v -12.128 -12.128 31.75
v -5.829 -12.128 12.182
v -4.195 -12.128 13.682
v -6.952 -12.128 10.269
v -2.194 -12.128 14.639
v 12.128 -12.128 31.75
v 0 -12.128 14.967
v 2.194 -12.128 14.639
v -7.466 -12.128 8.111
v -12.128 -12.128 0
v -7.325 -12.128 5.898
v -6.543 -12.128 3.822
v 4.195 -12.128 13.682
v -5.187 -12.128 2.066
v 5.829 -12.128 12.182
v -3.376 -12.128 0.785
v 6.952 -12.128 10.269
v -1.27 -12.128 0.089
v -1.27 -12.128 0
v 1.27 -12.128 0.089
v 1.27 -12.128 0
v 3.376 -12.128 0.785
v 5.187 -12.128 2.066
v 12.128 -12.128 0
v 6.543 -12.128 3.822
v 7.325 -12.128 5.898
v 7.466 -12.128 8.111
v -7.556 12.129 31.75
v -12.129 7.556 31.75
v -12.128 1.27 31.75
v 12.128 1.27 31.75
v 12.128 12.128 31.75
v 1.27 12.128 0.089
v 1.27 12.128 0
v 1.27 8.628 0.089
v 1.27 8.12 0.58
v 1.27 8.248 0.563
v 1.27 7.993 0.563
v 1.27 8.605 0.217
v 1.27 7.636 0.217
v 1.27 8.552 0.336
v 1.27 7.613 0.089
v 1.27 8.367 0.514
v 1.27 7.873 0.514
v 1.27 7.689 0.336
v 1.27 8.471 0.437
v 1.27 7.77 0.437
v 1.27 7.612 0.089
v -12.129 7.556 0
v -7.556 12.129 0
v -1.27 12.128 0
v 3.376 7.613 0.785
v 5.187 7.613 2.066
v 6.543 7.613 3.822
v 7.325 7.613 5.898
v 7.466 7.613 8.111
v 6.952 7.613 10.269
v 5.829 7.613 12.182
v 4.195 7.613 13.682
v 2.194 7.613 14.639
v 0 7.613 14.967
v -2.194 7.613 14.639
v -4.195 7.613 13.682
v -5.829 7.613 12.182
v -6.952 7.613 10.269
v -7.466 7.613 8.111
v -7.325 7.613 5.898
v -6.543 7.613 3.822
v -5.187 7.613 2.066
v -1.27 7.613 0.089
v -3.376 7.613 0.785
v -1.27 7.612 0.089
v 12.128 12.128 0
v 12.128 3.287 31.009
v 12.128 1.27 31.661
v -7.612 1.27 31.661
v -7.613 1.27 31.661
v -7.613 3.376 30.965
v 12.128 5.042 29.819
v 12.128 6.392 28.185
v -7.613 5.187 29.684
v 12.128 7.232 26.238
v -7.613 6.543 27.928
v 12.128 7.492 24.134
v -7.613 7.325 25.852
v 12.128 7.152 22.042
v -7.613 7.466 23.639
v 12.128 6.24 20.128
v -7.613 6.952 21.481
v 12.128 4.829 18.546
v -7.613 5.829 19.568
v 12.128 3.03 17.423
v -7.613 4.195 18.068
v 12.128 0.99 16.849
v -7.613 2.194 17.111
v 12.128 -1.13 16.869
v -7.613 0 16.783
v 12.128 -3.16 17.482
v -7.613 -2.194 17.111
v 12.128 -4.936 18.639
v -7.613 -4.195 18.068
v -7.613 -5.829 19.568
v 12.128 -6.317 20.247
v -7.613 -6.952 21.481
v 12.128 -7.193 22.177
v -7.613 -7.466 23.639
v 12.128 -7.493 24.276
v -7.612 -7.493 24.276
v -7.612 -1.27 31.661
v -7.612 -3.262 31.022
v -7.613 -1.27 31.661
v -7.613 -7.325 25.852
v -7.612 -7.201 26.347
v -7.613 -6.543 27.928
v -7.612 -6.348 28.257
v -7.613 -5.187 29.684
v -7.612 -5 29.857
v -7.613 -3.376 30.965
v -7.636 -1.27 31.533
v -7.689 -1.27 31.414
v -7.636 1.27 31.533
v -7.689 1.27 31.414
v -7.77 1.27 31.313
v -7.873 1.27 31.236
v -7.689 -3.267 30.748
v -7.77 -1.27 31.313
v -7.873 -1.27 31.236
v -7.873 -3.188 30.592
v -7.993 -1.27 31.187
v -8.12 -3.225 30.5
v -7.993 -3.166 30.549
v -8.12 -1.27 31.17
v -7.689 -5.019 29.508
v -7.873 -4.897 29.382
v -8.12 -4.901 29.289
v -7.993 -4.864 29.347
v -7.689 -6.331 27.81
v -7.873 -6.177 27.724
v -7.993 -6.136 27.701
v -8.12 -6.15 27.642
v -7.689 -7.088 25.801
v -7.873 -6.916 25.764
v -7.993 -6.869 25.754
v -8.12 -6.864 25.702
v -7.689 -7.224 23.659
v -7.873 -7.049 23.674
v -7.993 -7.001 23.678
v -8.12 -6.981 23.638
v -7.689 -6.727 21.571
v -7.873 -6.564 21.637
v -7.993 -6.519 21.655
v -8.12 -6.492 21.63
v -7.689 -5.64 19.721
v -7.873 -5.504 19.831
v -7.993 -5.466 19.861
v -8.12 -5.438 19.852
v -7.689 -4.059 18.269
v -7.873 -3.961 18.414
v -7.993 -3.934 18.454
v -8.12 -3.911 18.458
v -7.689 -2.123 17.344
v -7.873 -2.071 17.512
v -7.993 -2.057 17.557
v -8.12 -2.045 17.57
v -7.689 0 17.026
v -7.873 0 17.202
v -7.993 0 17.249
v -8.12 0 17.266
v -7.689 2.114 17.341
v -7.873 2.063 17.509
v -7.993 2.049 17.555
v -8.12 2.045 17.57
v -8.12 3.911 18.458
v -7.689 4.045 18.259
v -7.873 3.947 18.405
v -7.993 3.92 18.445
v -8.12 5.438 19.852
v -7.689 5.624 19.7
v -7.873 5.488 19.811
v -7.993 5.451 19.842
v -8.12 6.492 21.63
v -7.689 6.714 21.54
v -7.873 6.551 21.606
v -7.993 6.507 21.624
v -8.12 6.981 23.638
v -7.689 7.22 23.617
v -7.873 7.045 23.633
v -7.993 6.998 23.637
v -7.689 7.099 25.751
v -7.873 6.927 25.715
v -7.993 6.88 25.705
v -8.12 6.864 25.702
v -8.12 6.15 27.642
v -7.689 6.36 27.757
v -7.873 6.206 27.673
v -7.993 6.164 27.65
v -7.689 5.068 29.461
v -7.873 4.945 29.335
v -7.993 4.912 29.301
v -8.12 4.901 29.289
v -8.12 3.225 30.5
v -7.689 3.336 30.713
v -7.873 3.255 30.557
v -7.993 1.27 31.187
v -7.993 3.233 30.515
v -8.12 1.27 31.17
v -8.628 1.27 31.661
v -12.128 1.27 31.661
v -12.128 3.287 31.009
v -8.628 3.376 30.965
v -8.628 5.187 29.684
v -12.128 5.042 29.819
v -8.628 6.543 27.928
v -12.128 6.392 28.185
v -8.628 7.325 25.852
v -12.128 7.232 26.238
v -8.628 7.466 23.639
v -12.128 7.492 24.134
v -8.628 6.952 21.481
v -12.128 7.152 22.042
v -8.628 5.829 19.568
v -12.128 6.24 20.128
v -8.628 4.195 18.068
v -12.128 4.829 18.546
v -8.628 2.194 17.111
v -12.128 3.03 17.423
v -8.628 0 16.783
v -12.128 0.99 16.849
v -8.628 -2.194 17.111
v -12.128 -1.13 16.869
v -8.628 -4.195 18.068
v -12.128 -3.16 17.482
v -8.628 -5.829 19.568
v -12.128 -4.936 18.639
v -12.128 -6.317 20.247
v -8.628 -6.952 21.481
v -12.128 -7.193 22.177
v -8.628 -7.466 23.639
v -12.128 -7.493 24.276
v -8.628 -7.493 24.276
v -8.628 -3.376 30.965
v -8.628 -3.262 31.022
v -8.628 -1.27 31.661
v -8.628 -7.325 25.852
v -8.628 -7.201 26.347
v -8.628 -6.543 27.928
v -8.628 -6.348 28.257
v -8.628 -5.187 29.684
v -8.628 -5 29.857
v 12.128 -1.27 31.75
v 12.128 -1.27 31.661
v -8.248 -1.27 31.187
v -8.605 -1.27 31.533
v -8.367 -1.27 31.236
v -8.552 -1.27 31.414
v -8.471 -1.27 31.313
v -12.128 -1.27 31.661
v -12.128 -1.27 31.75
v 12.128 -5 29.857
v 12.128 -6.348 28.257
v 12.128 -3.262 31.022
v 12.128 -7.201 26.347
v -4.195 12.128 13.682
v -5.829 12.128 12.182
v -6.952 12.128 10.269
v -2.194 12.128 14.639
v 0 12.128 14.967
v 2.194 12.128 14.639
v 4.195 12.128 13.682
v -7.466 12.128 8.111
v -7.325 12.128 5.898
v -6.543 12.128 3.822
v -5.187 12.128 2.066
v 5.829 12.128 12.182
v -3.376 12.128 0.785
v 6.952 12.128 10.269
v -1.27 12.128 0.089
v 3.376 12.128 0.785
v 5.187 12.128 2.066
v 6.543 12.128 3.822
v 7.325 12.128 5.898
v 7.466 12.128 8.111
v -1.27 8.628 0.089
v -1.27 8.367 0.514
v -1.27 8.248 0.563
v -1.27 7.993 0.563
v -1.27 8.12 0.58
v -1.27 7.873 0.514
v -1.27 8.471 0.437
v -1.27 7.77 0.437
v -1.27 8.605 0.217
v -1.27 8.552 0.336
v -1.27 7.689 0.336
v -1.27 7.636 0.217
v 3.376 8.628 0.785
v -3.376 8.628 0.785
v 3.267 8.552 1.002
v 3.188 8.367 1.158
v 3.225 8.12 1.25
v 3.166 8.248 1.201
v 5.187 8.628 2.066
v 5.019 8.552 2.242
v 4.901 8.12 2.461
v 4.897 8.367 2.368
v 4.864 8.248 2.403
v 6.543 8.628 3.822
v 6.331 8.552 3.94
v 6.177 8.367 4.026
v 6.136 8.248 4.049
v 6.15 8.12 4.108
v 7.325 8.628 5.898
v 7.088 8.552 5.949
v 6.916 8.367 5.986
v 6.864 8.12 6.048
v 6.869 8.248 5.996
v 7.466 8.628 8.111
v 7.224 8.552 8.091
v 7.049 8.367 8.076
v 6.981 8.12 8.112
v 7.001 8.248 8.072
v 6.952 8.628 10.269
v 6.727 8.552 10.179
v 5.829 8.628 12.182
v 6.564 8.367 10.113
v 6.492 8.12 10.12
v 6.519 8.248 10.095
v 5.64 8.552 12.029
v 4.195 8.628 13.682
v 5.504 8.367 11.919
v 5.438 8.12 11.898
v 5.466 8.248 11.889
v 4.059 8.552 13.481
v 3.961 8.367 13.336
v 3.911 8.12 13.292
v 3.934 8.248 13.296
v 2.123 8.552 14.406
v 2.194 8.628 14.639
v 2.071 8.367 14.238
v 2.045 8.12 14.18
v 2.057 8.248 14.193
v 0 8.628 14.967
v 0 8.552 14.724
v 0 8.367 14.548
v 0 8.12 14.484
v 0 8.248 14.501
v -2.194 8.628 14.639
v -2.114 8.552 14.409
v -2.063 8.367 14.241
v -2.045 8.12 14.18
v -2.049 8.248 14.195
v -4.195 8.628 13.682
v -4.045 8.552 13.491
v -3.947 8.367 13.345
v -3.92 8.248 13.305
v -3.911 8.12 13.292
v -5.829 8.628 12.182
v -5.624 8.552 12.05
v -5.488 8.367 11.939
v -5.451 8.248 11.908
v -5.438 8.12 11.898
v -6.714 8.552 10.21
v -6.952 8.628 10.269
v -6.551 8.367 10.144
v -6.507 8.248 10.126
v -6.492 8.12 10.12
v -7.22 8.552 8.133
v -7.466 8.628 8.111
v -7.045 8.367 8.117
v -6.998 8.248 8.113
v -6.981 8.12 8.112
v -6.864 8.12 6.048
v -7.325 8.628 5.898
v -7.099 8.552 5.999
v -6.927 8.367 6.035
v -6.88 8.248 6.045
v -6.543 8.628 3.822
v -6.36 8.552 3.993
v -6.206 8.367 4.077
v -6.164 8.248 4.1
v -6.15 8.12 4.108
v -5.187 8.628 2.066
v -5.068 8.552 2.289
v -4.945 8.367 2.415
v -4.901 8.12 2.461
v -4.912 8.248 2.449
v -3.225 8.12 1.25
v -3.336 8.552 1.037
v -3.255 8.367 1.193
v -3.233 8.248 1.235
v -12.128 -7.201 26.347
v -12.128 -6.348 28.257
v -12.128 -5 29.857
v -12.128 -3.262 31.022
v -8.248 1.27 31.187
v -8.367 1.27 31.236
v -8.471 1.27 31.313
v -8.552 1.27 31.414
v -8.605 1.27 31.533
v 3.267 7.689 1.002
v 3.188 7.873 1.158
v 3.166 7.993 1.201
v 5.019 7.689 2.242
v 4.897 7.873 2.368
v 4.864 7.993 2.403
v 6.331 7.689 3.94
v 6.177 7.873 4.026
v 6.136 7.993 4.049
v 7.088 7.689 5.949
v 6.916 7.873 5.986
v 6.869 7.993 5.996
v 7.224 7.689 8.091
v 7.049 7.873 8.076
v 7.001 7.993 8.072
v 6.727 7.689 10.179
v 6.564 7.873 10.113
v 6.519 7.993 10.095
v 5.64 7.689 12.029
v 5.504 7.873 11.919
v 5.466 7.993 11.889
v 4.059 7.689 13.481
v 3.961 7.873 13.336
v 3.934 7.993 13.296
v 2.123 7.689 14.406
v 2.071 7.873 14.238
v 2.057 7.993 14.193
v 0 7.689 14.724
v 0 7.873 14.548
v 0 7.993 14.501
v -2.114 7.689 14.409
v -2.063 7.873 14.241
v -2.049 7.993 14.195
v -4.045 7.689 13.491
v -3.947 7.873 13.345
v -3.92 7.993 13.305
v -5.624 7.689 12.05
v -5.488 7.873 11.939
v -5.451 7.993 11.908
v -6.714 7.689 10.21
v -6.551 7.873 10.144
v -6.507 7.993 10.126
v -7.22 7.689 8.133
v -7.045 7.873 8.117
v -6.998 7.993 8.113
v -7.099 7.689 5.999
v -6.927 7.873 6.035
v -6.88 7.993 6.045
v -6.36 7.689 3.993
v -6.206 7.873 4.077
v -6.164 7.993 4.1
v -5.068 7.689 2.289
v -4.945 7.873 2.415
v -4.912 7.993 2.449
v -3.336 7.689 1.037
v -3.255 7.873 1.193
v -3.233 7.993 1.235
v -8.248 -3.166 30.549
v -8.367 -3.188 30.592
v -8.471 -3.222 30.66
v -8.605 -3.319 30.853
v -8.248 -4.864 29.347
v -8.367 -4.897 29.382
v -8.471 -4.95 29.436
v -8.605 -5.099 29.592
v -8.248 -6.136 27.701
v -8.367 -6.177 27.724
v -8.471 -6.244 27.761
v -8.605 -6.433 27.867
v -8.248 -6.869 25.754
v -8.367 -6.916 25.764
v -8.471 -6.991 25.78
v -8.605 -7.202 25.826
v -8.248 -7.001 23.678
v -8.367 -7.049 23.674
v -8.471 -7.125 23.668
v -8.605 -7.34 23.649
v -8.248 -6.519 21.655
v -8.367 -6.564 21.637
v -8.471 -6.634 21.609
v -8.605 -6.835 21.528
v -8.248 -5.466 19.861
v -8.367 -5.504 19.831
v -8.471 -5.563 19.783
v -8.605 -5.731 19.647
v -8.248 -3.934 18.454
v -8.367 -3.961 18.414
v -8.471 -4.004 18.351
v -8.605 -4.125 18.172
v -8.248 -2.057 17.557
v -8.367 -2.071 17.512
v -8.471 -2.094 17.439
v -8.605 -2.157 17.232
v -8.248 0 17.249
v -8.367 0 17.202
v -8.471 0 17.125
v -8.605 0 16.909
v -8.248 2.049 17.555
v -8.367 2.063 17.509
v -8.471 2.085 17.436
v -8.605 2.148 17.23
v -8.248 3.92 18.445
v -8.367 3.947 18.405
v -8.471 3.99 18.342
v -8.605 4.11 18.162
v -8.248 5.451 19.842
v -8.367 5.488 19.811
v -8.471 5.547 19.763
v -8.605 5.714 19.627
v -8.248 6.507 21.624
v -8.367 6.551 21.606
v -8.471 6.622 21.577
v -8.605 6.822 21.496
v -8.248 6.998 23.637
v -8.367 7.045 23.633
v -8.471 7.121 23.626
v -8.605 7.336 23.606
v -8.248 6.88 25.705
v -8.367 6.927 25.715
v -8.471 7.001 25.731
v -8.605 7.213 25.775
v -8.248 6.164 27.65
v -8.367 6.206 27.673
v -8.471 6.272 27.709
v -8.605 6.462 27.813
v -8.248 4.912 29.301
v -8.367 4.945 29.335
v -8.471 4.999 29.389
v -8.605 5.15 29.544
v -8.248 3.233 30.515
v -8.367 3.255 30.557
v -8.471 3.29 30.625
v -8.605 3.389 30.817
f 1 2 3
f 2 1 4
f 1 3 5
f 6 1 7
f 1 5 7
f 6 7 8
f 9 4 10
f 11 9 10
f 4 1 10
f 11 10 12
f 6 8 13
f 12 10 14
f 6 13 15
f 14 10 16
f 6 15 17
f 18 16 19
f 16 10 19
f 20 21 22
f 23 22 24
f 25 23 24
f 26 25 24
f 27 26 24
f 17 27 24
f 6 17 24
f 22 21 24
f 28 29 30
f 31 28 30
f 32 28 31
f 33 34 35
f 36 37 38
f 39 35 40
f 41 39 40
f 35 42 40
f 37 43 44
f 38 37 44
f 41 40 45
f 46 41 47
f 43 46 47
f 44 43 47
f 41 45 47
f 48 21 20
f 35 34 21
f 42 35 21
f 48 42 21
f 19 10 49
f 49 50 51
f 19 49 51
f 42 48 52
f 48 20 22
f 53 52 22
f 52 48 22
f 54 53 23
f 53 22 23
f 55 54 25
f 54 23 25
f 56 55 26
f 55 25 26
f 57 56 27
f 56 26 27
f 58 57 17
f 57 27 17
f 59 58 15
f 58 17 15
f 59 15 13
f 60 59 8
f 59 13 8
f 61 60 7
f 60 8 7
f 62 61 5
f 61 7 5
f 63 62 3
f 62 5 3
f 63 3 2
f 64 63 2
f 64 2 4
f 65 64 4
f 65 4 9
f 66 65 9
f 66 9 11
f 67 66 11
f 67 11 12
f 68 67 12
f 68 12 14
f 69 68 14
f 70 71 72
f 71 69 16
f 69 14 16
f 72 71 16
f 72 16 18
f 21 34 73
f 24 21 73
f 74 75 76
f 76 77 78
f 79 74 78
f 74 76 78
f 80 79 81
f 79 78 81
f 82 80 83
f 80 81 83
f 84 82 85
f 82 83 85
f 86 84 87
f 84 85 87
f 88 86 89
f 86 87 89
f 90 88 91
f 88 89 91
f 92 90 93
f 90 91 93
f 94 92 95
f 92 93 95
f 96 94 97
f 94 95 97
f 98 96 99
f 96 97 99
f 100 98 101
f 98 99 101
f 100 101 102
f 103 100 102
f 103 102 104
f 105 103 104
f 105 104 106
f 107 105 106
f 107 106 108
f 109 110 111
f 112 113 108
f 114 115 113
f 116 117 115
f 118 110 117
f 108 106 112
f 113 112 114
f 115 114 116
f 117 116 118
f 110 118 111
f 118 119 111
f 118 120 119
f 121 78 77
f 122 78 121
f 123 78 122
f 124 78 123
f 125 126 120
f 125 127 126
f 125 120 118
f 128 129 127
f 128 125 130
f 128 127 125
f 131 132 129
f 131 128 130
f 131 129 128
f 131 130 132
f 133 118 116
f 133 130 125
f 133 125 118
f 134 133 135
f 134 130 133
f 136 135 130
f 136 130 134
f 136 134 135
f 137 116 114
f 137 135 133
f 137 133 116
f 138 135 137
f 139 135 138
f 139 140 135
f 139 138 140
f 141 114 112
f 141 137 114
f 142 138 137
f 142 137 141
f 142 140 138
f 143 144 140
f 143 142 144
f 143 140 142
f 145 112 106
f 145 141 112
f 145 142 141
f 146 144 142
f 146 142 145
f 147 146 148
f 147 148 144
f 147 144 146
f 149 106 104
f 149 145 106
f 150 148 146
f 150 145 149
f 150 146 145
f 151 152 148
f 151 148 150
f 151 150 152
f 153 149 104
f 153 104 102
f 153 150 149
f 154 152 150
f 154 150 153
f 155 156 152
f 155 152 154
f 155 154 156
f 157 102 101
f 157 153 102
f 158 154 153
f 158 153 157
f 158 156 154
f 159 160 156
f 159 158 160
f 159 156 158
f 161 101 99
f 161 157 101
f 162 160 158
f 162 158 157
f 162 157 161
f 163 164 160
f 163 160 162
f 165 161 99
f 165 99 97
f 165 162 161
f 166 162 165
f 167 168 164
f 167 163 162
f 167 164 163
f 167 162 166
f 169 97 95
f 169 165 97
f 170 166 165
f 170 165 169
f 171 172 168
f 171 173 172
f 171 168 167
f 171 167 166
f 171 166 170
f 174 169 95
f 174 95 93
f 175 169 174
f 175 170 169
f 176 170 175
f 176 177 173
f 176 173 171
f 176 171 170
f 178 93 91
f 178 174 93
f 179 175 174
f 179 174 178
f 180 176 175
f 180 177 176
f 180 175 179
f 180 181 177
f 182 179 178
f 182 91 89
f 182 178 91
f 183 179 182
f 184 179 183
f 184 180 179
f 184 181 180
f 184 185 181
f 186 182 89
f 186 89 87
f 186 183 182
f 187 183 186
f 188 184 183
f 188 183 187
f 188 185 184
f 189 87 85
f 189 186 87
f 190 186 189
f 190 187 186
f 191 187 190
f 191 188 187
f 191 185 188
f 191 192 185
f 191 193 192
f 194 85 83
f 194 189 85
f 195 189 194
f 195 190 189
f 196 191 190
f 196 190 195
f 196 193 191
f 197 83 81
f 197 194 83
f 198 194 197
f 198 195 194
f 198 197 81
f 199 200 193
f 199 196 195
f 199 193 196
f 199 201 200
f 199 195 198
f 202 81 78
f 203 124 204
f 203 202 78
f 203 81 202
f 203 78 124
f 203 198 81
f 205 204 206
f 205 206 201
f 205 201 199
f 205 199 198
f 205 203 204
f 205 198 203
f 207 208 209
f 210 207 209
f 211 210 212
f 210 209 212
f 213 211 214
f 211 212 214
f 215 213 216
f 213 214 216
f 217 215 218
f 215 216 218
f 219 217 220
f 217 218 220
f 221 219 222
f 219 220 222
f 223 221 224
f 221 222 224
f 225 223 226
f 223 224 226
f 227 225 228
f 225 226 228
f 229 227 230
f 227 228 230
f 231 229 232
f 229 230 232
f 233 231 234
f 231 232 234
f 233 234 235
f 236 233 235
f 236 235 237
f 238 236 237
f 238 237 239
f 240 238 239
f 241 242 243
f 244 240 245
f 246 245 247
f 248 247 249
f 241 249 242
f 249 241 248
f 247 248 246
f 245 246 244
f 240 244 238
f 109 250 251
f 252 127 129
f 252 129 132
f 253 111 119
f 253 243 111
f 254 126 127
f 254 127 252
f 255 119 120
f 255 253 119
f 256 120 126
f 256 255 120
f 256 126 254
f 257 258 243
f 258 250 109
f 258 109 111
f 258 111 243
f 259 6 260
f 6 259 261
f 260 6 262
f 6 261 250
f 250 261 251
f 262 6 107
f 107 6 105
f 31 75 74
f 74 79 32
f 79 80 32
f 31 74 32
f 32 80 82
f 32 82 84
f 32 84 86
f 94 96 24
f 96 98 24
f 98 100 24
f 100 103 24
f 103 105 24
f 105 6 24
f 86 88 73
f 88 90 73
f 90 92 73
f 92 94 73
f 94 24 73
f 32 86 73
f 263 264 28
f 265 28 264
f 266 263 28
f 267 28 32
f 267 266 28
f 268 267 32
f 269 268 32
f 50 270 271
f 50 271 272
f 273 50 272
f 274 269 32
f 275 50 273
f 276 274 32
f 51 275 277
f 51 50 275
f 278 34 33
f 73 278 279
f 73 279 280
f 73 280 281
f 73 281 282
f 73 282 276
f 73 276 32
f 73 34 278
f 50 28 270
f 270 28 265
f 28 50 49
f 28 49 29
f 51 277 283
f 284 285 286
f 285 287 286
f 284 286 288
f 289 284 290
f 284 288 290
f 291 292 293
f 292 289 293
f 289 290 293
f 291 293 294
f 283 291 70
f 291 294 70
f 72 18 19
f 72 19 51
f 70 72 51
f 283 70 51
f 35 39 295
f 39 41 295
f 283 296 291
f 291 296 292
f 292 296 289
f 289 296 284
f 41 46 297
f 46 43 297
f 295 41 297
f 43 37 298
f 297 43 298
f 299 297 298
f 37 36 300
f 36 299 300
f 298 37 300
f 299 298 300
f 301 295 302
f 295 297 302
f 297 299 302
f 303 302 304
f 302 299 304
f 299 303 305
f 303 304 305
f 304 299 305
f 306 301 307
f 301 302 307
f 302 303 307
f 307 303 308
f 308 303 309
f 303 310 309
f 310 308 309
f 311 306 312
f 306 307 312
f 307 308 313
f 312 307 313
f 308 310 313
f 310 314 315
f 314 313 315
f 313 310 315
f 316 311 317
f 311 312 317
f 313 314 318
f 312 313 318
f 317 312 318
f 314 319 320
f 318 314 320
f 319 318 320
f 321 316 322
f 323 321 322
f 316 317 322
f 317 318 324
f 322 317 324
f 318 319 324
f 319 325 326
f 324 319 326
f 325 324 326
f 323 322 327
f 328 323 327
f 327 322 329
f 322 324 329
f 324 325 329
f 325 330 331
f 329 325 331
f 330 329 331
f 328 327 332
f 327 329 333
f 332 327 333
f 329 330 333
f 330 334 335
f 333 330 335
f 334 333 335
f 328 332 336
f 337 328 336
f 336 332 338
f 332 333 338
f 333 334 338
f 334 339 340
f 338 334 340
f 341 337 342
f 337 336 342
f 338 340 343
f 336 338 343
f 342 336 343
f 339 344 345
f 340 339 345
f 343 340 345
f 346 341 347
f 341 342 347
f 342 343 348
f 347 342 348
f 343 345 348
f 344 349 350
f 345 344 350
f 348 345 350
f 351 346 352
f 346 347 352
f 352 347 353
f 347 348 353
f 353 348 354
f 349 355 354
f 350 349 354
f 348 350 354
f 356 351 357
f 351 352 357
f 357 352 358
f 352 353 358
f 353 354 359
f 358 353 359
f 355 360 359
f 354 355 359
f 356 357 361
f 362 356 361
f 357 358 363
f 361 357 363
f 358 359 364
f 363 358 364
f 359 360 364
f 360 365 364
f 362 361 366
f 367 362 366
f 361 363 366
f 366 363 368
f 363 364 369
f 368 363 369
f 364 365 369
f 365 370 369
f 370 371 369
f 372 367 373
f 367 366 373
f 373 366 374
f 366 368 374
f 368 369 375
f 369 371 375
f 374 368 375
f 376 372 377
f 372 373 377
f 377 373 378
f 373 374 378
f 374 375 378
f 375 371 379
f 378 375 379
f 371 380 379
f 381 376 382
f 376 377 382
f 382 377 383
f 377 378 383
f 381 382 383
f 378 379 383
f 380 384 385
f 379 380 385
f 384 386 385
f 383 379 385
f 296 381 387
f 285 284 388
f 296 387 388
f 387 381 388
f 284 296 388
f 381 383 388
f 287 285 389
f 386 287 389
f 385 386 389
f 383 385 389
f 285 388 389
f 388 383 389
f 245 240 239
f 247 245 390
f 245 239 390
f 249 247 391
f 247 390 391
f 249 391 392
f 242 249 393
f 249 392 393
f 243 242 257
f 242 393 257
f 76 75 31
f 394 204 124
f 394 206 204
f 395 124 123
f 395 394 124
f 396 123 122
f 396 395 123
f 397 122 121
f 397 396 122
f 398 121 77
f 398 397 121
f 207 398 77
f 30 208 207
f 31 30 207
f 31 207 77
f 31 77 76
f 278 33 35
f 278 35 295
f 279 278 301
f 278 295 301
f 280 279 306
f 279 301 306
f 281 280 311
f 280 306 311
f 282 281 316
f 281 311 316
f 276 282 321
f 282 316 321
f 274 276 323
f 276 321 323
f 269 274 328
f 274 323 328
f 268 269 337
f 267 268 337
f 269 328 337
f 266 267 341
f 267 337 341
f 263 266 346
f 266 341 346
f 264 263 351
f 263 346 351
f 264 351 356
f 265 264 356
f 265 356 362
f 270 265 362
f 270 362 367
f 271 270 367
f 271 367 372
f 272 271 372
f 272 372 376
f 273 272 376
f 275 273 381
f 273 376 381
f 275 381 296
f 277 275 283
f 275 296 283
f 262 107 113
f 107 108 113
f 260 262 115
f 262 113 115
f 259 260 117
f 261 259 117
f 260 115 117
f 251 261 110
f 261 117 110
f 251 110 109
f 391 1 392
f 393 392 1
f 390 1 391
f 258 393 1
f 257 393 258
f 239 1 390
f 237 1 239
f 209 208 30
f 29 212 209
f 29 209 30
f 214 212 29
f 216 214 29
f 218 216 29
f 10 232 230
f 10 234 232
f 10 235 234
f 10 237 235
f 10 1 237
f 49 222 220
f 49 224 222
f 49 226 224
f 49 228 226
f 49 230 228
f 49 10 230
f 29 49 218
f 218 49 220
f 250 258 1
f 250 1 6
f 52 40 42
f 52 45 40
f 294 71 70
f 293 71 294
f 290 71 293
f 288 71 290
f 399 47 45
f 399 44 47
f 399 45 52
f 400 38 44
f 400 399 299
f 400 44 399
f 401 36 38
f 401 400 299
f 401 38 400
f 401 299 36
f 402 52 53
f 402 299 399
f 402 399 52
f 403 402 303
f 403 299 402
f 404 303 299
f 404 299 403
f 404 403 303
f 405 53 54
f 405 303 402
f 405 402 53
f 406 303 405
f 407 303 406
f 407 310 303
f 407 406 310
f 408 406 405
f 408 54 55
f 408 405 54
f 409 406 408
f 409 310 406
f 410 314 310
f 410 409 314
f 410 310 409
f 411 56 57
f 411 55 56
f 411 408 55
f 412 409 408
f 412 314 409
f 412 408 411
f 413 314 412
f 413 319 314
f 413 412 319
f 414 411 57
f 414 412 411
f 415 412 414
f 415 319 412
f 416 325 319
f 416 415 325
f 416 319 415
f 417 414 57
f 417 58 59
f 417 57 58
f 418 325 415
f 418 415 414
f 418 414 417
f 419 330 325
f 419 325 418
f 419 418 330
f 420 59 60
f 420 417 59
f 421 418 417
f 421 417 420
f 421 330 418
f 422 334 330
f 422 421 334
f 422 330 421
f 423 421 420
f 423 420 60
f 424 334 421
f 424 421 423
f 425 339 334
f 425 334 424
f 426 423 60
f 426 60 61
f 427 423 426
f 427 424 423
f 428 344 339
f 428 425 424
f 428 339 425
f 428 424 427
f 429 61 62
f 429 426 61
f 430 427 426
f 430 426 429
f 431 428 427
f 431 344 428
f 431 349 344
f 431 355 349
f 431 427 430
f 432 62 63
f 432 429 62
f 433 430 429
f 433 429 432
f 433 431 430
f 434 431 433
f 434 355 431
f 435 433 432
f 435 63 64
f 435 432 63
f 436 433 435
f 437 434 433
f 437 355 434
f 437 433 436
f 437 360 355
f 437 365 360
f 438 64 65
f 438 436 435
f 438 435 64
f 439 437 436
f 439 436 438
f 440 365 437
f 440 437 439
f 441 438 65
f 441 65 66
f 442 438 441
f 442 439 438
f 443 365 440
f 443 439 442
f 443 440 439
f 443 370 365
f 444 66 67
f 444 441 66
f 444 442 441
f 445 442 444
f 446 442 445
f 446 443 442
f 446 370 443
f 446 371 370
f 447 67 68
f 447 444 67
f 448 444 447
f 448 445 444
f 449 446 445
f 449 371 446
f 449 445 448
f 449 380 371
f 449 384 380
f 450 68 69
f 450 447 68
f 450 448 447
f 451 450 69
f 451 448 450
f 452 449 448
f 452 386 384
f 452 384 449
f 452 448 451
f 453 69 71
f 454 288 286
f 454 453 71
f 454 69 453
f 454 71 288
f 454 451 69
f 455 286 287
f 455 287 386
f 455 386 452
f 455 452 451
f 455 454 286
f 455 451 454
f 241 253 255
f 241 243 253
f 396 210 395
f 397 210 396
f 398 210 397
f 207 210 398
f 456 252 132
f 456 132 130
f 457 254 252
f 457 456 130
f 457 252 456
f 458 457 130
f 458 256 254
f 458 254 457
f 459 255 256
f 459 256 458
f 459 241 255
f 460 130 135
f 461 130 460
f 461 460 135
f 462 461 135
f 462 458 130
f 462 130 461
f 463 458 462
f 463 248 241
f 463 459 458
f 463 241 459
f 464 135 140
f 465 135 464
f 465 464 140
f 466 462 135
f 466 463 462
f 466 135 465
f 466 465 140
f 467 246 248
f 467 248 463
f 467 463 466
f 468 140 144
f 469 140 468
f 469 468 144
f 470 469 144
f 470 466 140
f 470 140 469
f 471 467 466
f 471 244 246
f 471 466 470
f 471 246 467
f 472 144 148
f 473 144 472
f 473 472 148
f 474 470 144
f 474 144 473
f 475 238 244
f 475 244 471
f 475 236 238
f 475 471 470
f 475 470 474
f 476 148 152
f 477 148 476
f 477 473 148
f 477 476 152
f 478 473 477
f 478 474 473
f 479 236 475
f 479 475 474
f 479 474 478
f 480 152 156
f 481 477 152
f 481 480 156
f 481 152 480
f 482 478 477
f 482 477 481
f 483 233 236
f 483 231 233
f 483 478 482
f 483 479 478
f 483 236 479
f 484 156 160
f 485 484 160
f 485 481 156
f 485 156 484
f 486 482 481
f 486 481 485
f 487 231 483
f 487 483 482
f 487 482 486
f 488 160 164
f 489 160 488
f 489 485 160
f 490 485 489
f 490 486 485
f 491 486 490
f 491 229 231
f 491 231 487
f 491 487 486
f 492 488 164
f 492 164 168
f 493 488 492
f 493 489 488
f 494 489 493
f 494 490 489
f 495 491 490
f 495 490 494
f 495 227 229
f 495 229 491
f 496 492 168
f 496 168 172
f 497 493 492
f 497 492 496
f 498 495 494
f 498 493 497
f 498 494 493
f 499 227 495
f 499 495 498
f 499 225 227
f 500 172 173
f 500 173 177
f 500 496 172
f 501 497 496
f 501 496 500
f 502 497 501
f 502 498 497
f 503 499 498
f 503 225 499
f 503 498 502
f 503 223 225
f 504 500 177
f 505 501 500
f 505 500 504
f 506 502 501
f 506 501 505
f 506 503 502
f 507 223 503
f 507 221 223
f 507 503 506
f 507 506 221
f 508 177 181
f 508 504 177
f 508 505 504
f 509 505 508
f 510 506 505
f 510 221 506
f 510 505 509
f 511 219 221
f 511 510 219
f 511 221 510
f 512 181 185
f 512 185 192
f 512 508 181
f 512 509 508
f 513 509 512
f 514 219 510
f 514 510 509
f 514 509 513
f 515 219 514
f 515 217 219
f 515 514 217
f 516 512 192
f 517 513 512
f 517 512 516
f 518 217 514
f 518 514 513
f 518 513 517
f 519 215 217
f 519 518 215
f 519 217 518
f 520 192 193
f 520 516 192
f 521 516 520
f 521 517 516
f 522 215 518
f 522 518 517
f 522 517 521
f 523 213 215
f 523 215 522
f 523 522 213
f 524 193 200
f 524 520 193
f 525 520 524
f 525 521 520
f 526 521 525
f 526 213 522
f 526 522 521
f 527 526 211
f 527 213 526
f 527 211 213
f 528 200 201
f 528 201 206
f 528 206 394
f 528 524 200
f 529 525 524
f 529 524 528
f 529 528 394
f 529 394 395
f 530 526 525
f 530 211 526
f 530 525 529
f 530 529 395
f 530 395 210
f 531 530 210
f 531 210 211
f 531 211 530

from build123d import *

# Parameters (mm, degrees)
F0_W          = 24.257
F0_H          = 24.257
F1_DEPTH      = 31.75
F3_DEPTH      = 25.4
F5_DEPTH      = 25.4
F9_DEPTH      = 1.016
F11_DEPTH     = 1.016
F12_T4_ANGLE  = 359.64
F12_S5_R      = 7.493
F12_T6_DEPTH  = 13
F12_T10_ANGLE = 359.64
F12_S11_R     = 7.493
F12_T12_DEPTH = 13
F12_T16_ANGLE = 359.64
F12_S17_R     = 7.493
F12_T18_DEPTH = 14
F12_T22_ANGLE = 359.64
F12_S23_R     = 7.493
F12_T24_DEPTH = 14
F13_SIZE      = 4.572


# Not quite as in the source:
# - a fillet or chamfer that OpenCascade refuses, or shapes differently, is made with other operations: its cross-section is extruded or revolved along the edge and cut away or added


with BuildPart() as f1:
    # F0 (on Top) → F1 (new body)
    with BuildSketch(Plane.XY):
        Rectangle(F0_W, F0_H)
    extrude(amount=F1_DEPTH)

    # F2 (on face) → F3 (cut)
    with BuildSketch(Plane.XZ.offset(12.1285)):
        with BuildLine():
            Line((1.27, 0), (1.27, 0.0893613859))
            ThreePointArc((1.27, 0.0893613859), (0, 14.96695), (-1.27, 0.0893613859))
            Line((-1.27, 0.0893613859), (-1.27, 0))
            Line((-1.27, 0), (1.27, 0))
        make_face()
    extrude(amount=-F3_DEPTH, mode=Mode.SUBTRACT)

    # F4 (on face) → F5 (cut)
    with BuildSketch(Plane(origin=(-12.1285, 0, 0), x_dir=(0, -1, 0), z_dir=(-1, 0, 0))):
        with BuildLine():
            ThreePointArc((-1.27, 31.6606386141), (-4.8285059283, 18.5462524905), (7.493, 24.27605))
            ThreePointArc((7.493, 24.27605), (5.7297975095, 29.1045559283), (1.27, 31.6606386141))
            ThreePointArc((1.27, 31.6606386141), (0.9030893061, 31.7144287686), (0.5339666633, 31.75))
            Line((0.5339666633, 31.75), (-0.5339666633, 31.75))
            ThreePointArc((-0.5339666633, 31.75), (-0.9030893061, 31.7144287686), (-1.27, 31.6606386141))
        make_face()
        with BuildLine():
            ThreePointArc((0.5339666633, 31.75), (0.9030893061, 31.7144287686), (1.27, 31.6606386141))
            Line((1.27, 31.6606386141), (1.27, 31.75))
            Line((1.27, 31.75), (0.5339666633, 31.75))
        make_face()
        with BuildLine():
            Line((-1.27, 31.75), (-1.27, 31.6606386141))
            ThreePointArc((-1.27, 31.6606386141), (-0.9030893061, 31.7144287686), (-0.5339666633, 31.75))
            Line((-0.5339666633, 31.75), (-1.27, 31.75))
        make_face()
        with BuildLine():
            Line((-0.5339666633, 31.75), (0.5339666633, 31.75))
            ThreePointArc((0.5339666633, 31.75), (0, 31.76905), (-0.5339666633, 31.75))
        make_face()
    extrude(amount=-F5_DEPTH, mode=Mode.SUBTRACT)

    # F8 (on offset) → F9 (join)
    with BuildSketch(Plane(origin=(-8.62838, 0, 0), x_dir=(0, -1, 0), z_dir=(-1, 0, 0))):
        with BuildLine():
            Line((-1.27, 31.1704541193), (-1.27, 31.6606386141))
            ThreePointArc((-1.27, 31.6606386141), (0, 16.78305), (1.27, 31.6606386141))
            Line((1.27, 31.6606386141), (1.27, 31.1704541193))
            ThreePointArc((1.27, 31.1704541193), (0, 17.26565), (-1.27, 31.1704541193))
        make_face()
    extrude(amount=-F9_DEPTH)

    # F10 (on offset) → F11 (join)
    with BuildSketch(Plane(origin=(0, 8.62838, 0), x_dir=(-1, 0, 0), z_dir=(0, 1, 0))):
        with BuildLine():
            ThreePointArc((1.27, 0.0893613859), (0, 14.96695), (-1.27, 0.0893613859))
            Line((-1.27, 0.0893613859), (-1.27, 0.5795458807))
            ThreePointArc((-1.27, 0.5795458807), (0, 14.48435), (1.27, 0.5795458807))
            Line((1.27, 0.5795458807), (1.27, 0.0893613859))
        make_face()
    extrude(amount=-F11_DEPTH)

    # F12: fillet of radius 0.508 on 4 edges, made by hand


with BuildPart() as f12_tool2:
    # F12_s3 → F12_t4 (revolve)
    with BuildSketch(Plane(origin=(0.0234799519, 0, 7.37647e-05), x_dir=(0, 1, 0), z_dir=(-0.9999950652, 0, -0.0031415875))):
        with BuildLine():
            ThreePointArc((8.62838, 0.0444868824), (8.4795902448, -0.3147233624), (8.12038, -0.4635131176))
            Line((8.12038, -0.4635131176), (8.62838, -0.4635131176))
            Line((8.62838, -0.4635131176), (8.62838, 0.0444868824))
        make_face()
    revolve(axis=Axis((0, 8.62838, 7.47395), (0, -1, 0)), revolution_arc=F12_T4_ANGLE)

    # F12_s5 → F12_t6 (intersect, symmetric)
    with BuildSketch(Plane.XZ.offset(-8.2)):
        with Locations((0, 7.47395)):
            Circle(F12_S5_R)
    extrude(amount=F12_T6_DEPTH, both=True, mode=Mode.INTERSECT)


with BuildPart() as f1_1:
    add(f1.part)

    # F12_t1: cut F12_tool2
    add(f12_tool2.part, mode=Mode.SUBTRACT)


with BuildPart() as f12_tool8:
    # F12_s9 → F12_t10 (revolve)
    with BuildSketch(Plane(origin=(0.0234799519, 0, 7.37647e-05), x_dir=(0, 1, 0), z_dir=(-0.9999950652, 0, -0.0031415875))):
        with BuildLine():
            ThreePointArc((7.61238, 0.0444868824), (7.7611697552, -0.3147233624), (8.12038, -0.4635131176))
            Line((8.12038, -0.4635131176), (7.61238, -0.4635131176))
            Line((7.61238, -0.4635131176), (7.61238, 0.0444868824))
        make_face()
    revolve(axis=Axis((0, 7.61238, 7.47395), (0, -1, 0)), revolution_arc=F12_T10_ANGLE)

    # F12_s11 → F12_t12 (intersect, symmetric)
    with BuildSketch(Plane.XZ.offset(-7.9)):
        with Locations((0, 7.47395)):
            Circle(F12_S11_R)
    extrude(amount=F12_T12_DEPTH, both=True, mode=Mode.INTERSECT)


with BuildPart() as f1_2:
    add(f1_1.part)

    # F12_t7: cut F12_tool8
    add(f12_tool8.part, mode=Mode.SUBTRACT)


with BuildPart() as f12_tool14:
    # F12_s15 → F12_t16 (revolve)
    with BuildSketch(Plane(origin=(0, 0.0762649585, 0.0002395942), x_dir=(1, 0, 0), z_dir=(0, 0.9999950652, 0.0031415875))):
        with BuildLine():
            ThreePointArc((-7.61238, -31.7943302026), (-7.7611697552, -31.4351199578), (-8.12038, -31.2863302026))
            Line((-8.12038, -31.2863302026), (-7.61238, -31.2863302026))
            Line((-7.61238, -31.2863302026), (-7.61238, -31.7943302026))
        make_face()
    revolve(axis=Axis((-7.61238, 0, 24.27605), (1, 0, 0)), revolution_arc=F12_T16_ANGLE)

    # F12_s17 → F12_t18 (intersect, symmetric)
    with BuildSketch(Plane.YZ.offset(-8)):
        with Locations((0, 24.27605)):
            Circle(F12_S17_R)
    extrude(amount=F12_T18_DEPTH, both=True, mode=Mode.INTERSECT)


with BuildPart() as f1_3:
    add(f1_2.part)

    # F12_t13: cut F12_tool14
    add(f12_tool14.part, mode=Mode.SUBTRACT)


with BuildPart() as f12_tool20:
    # F12_s21 → F12_t22 (revolve)
    with BuildSketch(Plane(origin=(0, 0.0762649585, 0.0002395942), x_dir=(1, 0, 0), z_dir=(0, 0.9999950652, 0.0031415875))):
        with BuildLine():
            ThreePointArc((-8.12038, -31.2863302026), (-8.4795902448, -31.4351199578), (-8.62838, -31.7943302026))
            Line((-8.62838, -31.7943302026), (-8.62838, -31.2863302026))
            Line((-8.62838, -31.2863302026), (-8.12038, -31.2863302026))
        make_face()
    revolve(axis=Axis((-8.62838, 0, 24.27605), (1, 0, 0)), revolution_arc=F12_T22_ANGLE)

    # F12_s23 → F12_t24 (intersect, symmetric)
    with BuildSketch(Plane.YZ.offset(-8.4)):
        with Locations((0, 24.27605)):
            Circle(F12_S23_R)
    extrude(amount=F12_T24_DEPTH, both=True, mode=Mode.INTERSECT)


with BuildPart() as f1_4:
    add(f1_3.part)

    # F12_t19: cut F12_tool20
    add(f12_tool20.part, mode=Mode.SUBTRACT)

    # F13
    f13_edges = [f1_4.edges().sort_by_distance(p)[0] for p in [
        (-12.1285, 12.1285, 15.875),
    ]]
    chamfer(f13_edges, length=F13_SIZE)


solid = f1_4.part
